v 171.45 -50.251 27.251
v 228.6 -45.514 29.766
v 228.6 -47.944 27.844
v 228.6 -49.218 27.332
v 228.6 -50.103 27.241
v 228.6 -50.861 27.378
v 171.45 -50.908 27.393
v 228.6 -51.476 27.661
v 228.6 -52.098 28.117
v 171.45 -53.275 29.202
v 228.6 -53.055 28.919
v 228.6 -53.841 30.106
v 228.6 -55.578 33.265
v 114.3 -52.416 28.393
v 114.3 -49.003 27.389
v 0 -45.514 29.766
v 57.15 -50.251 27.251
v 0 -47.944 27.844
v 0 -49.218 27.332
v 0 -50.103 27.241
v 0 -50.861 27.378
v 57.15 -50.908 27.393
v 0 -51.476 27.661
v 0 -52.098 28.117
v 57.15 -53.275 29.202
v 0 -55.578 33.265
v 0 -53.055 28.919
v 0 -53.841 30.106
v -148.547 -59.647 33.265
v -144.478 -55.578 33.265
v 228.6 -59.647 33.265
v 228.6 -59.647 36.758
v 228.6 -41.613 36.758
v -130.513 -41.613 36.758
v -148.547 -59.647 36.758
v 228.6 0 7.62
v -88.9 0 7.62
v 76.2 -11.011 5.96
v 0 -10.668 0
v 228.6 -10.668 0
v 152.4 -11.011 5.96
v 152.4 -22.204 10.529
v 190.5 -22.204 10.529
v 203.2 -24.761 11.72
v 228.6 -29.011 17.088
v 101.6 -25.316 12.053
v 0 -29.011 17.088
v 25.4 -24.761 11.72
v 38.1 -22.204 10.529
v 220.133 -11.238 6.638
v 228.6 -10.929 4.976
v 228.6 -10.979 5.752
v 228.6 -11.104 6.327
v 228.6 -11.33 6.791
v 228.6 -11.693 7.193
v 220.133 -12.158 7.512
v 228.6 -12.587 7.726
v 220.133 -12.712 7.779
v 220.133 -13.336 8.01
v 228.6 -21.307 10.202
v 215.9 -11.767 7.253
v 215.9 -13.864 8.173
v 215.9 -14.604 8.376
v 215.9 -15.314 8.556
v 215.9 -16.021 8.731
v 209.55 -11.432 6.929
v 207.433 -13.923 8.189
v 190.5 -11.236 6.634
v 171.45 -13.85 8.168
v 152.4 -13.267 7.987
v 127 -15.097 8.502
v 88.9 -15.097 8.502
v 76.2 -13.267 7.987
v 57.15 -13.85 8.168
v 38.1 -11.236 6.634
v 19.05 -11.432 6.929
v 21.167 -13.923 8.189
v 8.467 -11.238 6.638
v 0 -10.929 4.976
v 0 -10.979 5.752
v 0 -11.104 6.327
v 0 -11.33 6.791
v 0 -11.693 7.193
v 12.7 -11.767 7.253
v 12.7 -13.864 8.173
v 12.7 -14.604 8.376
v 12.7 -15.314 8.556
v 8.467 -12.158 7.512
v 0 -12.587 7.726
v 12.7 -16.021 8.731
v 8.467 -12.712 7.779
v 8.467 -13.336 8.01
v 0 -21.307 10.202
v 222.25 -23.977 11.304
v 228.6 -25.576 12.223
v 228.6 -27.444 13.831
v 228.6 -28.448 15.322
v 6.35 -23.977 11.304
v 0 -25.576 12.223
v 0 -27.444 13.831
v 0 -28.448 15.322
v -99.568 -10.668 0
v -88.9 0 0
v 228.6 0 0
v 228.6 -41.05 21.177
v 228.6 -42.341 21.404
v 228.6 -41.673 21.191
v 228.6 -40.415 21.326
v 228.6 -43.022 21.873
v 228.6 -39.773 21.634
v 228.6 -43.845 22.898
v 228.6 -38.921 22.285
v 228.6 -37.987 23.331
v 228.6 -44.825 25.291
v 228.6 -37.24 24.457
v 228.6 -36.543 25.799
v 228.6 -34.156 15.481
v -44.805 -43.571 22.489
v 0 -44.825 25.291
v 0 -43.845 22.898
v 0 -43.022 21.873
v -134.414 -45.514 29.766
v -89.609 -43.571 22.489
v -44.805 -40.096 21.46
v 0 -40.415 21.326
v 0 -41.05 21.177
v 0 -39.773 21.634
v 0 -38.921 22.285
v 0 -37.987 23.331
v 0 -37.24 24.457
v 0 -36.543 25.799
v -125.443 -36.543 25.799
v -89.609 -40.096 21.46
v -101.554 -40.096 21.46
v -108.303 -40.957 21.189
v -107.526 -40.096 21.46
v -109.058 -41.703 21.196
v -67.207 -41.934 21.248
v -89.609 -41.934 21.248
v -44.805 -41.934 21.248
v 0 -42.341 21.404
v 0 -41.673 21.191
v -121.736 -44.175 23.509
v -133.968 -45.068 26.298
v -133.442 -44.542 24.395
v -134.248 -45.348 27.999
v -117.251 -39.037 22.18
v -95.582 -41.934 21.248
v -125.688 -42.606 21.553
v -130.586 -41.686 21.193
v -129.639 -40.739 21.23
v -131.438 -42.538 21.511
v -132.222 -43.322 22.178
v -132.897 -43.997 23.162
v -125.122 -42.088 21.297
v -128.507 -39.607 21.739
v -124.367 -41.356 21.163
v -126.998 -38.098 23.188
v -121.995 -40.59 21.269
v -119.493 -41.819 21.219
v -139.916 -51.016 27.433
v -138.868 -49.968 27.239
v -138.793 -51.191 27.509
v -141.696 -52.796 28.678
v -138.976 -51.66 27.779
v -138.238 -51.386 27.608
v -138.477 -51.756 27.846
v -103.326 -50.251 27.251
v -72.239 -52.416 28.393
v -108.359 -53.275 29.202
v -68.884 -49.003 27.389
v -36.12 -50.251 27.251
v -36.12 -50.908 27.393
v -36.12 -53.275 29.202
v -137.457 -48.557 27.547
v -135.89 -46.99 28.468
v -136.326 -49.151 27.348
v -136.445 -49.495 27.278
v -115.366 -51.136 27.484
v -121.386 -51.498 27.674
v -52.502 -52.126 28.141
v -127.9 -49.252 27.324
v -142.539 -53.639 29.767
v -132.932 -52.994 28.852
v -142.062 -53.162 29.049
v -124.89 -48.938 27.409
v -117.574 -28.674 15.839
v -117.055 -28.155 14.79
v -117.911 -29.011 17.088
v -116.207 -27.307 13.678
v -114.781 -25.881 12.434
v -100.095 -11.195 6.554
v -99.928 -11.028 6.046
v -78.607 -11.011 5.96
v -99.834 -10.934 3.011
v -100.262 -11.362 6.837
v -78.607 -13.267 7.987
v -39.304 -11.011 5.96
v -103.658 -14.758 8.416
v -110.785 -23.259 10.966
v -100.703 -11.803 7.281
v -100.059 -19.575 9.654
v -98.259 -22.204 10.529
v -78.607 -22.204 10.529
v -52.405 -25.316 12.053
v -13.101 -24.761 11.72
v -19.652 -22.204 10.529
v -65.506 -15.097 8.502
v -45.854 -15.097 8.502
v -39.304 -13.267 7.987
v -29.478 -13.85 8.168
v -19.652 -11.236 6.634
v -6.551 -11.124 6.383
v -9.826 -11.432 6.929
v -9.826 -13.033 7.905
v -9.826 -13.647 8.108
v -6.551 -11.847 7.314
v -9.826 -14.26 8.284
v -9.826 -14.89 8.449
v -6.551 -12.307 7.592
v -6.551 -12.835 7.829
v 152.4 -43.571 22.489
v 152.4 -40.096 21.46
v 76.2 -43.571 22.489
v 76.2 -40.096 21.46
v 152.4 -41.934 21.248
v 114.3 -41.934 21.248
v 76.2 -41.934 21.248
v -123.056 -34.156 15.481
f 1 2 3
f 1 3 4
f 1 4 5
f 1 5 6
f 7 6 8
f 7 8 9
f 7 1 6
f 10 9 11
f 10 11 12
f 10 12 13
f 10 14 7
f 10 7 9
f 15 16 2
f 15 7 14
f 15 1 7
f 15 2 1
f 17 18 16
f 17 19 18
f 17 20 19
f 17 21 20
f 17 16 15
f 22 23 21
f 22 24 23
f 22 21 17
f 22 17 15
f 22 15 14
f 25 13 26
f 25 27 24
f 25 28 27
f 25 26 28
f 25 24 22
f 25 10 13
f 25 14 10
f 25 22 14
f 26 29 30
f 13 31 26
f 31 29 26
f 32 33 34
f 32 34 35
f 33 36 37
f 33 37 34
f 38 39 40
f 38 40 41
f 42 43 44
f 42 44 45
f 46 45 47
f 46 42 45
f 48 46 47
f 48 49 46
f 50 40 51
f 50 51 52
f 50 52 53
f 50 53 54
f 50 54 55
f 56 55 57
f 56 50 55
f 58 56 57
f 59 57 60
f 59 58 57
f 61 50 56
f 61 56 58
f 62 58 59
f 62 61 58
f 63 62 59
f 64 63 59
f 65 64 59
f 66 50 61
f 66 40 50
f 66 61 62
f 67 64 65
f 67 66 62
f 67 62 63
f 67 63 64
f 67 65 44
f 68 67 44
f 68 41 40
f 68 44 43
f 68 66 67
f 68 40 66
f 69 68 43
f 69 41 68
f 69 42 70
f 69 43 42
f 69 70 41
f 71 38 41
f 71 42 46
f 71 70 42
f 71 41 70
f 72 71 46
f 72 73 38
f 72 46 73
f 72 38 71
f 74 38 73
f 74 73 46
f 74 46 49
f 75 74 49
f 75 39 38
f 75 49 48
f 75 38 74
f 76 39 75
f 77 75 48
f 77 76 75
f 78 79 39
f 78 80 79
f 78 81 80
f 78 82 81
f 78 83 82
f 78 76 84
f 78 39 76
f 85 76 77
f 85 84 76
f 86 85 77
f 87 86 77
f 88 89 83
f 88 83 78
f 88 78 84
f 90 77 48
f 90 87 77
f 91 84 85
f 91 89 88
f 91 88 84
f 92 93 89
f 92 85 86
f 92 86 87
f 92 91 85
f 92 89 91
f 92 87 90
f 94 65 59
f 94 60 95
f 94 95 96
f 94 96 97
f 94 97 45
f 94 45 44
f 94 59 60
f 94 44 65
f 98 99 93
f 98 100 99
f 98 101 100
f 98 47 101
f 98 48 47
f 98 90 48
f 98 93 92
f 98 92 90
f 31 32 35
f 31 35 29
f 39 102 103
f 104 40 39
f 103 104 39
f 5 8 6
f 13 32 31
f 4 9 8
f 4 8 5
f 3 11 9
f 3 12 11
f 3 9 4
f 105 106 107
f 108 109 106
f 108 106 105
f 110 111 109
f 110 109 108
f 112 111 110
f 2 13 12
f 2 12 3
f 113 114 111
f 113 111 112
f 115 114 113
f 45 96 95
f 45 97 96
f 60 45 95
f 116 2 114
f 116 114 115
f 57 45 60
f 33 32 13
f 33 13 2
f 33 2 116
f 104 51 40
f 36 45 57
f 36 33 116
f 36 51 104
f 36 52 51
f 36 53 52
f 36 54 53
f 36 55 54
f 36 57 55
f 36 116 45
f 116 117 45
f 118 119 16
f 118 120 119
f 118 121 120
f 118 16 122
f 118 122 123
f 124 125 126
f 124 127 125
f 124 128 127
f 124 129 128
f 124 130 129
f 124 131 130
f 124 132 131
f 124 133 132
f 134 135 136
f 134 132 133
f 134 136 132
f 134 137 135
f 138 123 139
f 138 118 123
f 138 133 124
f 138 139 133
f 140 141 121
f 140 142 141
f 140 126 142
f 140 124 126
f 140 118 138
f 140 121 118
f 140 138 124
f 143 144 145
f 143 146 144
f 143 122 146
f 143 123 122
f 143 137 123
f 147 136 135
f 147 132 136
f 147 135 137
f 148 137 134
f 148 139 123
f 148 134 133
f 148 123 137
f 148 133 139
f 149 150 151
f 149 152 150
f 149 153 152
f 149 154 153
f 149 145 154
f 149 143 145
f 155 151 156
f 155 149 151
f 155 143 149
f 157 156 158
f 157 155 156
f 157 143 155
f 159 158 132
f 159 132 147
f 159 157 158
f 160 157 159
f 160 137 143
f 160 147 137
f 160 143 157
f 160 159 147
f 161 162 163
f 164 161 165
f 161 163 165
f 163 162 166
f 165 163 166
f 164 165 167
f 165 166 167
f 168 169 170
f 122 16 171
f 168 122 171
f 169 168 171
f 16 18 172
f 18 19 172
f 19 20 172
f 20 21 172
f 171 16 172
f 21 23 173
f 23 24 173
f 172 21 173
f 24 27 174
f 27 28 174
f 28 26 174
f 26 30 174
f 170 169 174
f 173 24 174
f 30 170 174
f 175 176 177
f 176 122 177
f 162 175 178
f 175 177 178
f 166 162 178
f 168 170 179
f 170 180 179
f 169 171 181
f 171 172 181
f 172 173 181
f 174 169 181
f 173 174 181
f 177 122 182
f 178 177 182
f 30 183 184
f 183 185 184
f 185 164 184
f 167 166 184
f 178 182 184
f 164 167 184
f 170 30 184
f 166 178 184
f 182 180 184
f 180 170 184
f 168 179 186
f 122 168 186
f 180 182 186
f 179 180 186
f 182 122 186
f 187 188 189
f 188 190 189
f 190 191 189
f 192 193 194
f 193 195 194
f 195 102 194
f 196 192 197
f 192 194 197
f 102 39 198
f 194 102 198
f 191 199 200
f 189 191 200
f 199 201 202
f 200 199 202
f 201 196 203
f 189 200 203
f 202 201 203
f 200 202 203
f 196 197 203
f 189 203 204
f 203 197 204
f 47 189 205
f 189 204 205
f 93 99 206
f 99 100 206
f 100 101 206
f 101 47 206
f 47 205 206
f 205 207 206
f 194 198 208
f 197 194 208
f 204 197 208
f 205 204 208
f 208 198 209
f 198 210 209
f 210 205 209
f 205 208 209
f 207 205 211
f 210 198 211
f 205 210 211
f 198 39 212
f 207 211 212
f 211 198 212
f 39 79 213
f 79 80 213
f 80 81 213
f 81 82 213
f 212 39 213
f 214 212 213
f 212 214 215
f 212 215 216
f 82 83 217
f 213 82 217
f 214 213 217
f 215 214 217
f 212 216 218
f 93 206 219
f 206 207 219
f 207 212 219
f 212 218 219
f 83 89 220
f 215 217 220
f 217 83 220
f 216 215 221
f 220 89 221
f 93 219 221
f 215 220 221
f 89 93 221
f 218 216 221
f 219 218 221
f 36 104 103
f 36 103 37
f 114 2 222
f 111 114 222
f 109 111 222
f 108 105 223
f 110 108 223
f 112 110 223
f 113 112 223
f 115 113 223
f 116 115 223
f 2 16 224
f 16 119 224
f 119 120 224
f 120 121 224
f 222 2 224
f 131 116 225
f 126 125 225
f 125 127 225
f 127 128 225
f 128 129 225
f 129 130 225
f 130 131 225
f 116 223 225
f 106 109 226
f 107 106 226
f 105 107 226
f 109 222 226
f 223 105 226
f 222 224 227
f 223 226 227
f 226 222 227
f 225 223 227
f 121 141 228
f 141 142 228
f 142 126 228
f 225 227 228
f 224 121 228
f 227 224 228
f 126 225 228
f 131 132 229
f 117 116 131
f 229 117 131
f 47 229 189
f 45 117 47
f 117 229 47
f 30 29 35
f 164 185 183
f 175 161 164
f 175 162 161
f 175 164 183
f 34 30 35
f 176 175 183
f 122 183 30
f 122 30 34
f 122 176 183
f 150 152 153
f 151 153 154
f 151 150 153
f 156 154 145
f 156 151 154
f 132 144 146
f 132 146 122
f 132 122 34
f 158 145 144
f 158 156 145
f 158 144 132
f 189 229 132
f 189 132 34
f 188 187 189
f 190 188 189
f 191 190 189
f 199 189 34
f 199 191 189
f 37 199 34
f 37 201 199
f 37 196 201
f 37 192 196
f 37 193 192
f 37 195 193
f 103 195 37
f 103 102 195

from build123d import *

# Parameters (mm, degrees)
F1_DEPTH      = 228.6
F1_DEPTH_BACK = 177.8
F3_DEPTH      = 36.7586830666


with BuildPart() as f1:
    # F0 (on Right) → F1 (new body, two sides)
    with BuildSketch(Plane.YZ) as f1_sk:
        with BuildLine():
            Line((0, 0), (0, 7.62))
            Line((0, 7.62), (-41.6129238499, 36.7576829666))
            Line((-41.6129238499, 36.7576829666), (-59.6469238499, 36.7576829666))
            Line((-59.6469238499, 36.7576829666), (-59.6469238499, 33.2651829666))
            Line((-59.6469238499, 33.2651829666), (-55.5780977011, 33.2651829666))
            add(Edge.make_bspline(
                [(-45.5138377747, 29.7663135135), (-49.731985016, 25.5481662722), (-53.3485413037, 29.721554147), (-52.9368298251, 28.3284333935), (-55.5780977011, 33.2651829666)],
                knots=[0, 0, 0, 0, 0.5239815067, 1, 1, 1, 1], degree=3))
            add(Edge.make_bspline(
                [(-45.5138377747, 29.7663135135), (-44.8237836263, 19.0704984271), (-39.6483905515, 19.0704984271), (-36.5431561968, 25.7985124045)],
                knots=[0, 0, 0, 0, 9.8090047208, 9.8090047208, 9.8090047208, 9.8090047208], degree=3))
            Line((-36.5431561968, 25.7985124045), (-34.1559106391, 15.4807388001))
            Line((-34.1559106391, 15.4807388001), (-29.0110725909, 17.0878581703))
            add(Edge.make_bspline(
                [(-10.668, 0), (-11.1579841904, 2.7979269635), (-10.5047915864, 6.0449118409), (-12.8343535403, 8.8698779258), (-27.9113658404, 10.4050231017), (-29.0110725909, 17.0878581703)],
                knots=[0, 0, 0, 0, 0.289167973, 0.4952865565, 1, 1, 1, 1], degree=3))
            Line((-10.668, 0), (0, 0))
        make_face()
    extrude(amount=F1_DEPTH)
    extrude(f1_sk.sketch, amount=-F1_DEPTH_BACK)

    # F2 (on Top) → F3 (cut, through all)
    with BuildSketch(Plane.XY):
        Polygon((-192.6036879301, -103.7036879301), (-88.9, 0), (-192.6036879301, 0), align=None)
    extrude(amount=F3_DEPTH, mode=Mode.SUBTRACT)


solid = f1.part
